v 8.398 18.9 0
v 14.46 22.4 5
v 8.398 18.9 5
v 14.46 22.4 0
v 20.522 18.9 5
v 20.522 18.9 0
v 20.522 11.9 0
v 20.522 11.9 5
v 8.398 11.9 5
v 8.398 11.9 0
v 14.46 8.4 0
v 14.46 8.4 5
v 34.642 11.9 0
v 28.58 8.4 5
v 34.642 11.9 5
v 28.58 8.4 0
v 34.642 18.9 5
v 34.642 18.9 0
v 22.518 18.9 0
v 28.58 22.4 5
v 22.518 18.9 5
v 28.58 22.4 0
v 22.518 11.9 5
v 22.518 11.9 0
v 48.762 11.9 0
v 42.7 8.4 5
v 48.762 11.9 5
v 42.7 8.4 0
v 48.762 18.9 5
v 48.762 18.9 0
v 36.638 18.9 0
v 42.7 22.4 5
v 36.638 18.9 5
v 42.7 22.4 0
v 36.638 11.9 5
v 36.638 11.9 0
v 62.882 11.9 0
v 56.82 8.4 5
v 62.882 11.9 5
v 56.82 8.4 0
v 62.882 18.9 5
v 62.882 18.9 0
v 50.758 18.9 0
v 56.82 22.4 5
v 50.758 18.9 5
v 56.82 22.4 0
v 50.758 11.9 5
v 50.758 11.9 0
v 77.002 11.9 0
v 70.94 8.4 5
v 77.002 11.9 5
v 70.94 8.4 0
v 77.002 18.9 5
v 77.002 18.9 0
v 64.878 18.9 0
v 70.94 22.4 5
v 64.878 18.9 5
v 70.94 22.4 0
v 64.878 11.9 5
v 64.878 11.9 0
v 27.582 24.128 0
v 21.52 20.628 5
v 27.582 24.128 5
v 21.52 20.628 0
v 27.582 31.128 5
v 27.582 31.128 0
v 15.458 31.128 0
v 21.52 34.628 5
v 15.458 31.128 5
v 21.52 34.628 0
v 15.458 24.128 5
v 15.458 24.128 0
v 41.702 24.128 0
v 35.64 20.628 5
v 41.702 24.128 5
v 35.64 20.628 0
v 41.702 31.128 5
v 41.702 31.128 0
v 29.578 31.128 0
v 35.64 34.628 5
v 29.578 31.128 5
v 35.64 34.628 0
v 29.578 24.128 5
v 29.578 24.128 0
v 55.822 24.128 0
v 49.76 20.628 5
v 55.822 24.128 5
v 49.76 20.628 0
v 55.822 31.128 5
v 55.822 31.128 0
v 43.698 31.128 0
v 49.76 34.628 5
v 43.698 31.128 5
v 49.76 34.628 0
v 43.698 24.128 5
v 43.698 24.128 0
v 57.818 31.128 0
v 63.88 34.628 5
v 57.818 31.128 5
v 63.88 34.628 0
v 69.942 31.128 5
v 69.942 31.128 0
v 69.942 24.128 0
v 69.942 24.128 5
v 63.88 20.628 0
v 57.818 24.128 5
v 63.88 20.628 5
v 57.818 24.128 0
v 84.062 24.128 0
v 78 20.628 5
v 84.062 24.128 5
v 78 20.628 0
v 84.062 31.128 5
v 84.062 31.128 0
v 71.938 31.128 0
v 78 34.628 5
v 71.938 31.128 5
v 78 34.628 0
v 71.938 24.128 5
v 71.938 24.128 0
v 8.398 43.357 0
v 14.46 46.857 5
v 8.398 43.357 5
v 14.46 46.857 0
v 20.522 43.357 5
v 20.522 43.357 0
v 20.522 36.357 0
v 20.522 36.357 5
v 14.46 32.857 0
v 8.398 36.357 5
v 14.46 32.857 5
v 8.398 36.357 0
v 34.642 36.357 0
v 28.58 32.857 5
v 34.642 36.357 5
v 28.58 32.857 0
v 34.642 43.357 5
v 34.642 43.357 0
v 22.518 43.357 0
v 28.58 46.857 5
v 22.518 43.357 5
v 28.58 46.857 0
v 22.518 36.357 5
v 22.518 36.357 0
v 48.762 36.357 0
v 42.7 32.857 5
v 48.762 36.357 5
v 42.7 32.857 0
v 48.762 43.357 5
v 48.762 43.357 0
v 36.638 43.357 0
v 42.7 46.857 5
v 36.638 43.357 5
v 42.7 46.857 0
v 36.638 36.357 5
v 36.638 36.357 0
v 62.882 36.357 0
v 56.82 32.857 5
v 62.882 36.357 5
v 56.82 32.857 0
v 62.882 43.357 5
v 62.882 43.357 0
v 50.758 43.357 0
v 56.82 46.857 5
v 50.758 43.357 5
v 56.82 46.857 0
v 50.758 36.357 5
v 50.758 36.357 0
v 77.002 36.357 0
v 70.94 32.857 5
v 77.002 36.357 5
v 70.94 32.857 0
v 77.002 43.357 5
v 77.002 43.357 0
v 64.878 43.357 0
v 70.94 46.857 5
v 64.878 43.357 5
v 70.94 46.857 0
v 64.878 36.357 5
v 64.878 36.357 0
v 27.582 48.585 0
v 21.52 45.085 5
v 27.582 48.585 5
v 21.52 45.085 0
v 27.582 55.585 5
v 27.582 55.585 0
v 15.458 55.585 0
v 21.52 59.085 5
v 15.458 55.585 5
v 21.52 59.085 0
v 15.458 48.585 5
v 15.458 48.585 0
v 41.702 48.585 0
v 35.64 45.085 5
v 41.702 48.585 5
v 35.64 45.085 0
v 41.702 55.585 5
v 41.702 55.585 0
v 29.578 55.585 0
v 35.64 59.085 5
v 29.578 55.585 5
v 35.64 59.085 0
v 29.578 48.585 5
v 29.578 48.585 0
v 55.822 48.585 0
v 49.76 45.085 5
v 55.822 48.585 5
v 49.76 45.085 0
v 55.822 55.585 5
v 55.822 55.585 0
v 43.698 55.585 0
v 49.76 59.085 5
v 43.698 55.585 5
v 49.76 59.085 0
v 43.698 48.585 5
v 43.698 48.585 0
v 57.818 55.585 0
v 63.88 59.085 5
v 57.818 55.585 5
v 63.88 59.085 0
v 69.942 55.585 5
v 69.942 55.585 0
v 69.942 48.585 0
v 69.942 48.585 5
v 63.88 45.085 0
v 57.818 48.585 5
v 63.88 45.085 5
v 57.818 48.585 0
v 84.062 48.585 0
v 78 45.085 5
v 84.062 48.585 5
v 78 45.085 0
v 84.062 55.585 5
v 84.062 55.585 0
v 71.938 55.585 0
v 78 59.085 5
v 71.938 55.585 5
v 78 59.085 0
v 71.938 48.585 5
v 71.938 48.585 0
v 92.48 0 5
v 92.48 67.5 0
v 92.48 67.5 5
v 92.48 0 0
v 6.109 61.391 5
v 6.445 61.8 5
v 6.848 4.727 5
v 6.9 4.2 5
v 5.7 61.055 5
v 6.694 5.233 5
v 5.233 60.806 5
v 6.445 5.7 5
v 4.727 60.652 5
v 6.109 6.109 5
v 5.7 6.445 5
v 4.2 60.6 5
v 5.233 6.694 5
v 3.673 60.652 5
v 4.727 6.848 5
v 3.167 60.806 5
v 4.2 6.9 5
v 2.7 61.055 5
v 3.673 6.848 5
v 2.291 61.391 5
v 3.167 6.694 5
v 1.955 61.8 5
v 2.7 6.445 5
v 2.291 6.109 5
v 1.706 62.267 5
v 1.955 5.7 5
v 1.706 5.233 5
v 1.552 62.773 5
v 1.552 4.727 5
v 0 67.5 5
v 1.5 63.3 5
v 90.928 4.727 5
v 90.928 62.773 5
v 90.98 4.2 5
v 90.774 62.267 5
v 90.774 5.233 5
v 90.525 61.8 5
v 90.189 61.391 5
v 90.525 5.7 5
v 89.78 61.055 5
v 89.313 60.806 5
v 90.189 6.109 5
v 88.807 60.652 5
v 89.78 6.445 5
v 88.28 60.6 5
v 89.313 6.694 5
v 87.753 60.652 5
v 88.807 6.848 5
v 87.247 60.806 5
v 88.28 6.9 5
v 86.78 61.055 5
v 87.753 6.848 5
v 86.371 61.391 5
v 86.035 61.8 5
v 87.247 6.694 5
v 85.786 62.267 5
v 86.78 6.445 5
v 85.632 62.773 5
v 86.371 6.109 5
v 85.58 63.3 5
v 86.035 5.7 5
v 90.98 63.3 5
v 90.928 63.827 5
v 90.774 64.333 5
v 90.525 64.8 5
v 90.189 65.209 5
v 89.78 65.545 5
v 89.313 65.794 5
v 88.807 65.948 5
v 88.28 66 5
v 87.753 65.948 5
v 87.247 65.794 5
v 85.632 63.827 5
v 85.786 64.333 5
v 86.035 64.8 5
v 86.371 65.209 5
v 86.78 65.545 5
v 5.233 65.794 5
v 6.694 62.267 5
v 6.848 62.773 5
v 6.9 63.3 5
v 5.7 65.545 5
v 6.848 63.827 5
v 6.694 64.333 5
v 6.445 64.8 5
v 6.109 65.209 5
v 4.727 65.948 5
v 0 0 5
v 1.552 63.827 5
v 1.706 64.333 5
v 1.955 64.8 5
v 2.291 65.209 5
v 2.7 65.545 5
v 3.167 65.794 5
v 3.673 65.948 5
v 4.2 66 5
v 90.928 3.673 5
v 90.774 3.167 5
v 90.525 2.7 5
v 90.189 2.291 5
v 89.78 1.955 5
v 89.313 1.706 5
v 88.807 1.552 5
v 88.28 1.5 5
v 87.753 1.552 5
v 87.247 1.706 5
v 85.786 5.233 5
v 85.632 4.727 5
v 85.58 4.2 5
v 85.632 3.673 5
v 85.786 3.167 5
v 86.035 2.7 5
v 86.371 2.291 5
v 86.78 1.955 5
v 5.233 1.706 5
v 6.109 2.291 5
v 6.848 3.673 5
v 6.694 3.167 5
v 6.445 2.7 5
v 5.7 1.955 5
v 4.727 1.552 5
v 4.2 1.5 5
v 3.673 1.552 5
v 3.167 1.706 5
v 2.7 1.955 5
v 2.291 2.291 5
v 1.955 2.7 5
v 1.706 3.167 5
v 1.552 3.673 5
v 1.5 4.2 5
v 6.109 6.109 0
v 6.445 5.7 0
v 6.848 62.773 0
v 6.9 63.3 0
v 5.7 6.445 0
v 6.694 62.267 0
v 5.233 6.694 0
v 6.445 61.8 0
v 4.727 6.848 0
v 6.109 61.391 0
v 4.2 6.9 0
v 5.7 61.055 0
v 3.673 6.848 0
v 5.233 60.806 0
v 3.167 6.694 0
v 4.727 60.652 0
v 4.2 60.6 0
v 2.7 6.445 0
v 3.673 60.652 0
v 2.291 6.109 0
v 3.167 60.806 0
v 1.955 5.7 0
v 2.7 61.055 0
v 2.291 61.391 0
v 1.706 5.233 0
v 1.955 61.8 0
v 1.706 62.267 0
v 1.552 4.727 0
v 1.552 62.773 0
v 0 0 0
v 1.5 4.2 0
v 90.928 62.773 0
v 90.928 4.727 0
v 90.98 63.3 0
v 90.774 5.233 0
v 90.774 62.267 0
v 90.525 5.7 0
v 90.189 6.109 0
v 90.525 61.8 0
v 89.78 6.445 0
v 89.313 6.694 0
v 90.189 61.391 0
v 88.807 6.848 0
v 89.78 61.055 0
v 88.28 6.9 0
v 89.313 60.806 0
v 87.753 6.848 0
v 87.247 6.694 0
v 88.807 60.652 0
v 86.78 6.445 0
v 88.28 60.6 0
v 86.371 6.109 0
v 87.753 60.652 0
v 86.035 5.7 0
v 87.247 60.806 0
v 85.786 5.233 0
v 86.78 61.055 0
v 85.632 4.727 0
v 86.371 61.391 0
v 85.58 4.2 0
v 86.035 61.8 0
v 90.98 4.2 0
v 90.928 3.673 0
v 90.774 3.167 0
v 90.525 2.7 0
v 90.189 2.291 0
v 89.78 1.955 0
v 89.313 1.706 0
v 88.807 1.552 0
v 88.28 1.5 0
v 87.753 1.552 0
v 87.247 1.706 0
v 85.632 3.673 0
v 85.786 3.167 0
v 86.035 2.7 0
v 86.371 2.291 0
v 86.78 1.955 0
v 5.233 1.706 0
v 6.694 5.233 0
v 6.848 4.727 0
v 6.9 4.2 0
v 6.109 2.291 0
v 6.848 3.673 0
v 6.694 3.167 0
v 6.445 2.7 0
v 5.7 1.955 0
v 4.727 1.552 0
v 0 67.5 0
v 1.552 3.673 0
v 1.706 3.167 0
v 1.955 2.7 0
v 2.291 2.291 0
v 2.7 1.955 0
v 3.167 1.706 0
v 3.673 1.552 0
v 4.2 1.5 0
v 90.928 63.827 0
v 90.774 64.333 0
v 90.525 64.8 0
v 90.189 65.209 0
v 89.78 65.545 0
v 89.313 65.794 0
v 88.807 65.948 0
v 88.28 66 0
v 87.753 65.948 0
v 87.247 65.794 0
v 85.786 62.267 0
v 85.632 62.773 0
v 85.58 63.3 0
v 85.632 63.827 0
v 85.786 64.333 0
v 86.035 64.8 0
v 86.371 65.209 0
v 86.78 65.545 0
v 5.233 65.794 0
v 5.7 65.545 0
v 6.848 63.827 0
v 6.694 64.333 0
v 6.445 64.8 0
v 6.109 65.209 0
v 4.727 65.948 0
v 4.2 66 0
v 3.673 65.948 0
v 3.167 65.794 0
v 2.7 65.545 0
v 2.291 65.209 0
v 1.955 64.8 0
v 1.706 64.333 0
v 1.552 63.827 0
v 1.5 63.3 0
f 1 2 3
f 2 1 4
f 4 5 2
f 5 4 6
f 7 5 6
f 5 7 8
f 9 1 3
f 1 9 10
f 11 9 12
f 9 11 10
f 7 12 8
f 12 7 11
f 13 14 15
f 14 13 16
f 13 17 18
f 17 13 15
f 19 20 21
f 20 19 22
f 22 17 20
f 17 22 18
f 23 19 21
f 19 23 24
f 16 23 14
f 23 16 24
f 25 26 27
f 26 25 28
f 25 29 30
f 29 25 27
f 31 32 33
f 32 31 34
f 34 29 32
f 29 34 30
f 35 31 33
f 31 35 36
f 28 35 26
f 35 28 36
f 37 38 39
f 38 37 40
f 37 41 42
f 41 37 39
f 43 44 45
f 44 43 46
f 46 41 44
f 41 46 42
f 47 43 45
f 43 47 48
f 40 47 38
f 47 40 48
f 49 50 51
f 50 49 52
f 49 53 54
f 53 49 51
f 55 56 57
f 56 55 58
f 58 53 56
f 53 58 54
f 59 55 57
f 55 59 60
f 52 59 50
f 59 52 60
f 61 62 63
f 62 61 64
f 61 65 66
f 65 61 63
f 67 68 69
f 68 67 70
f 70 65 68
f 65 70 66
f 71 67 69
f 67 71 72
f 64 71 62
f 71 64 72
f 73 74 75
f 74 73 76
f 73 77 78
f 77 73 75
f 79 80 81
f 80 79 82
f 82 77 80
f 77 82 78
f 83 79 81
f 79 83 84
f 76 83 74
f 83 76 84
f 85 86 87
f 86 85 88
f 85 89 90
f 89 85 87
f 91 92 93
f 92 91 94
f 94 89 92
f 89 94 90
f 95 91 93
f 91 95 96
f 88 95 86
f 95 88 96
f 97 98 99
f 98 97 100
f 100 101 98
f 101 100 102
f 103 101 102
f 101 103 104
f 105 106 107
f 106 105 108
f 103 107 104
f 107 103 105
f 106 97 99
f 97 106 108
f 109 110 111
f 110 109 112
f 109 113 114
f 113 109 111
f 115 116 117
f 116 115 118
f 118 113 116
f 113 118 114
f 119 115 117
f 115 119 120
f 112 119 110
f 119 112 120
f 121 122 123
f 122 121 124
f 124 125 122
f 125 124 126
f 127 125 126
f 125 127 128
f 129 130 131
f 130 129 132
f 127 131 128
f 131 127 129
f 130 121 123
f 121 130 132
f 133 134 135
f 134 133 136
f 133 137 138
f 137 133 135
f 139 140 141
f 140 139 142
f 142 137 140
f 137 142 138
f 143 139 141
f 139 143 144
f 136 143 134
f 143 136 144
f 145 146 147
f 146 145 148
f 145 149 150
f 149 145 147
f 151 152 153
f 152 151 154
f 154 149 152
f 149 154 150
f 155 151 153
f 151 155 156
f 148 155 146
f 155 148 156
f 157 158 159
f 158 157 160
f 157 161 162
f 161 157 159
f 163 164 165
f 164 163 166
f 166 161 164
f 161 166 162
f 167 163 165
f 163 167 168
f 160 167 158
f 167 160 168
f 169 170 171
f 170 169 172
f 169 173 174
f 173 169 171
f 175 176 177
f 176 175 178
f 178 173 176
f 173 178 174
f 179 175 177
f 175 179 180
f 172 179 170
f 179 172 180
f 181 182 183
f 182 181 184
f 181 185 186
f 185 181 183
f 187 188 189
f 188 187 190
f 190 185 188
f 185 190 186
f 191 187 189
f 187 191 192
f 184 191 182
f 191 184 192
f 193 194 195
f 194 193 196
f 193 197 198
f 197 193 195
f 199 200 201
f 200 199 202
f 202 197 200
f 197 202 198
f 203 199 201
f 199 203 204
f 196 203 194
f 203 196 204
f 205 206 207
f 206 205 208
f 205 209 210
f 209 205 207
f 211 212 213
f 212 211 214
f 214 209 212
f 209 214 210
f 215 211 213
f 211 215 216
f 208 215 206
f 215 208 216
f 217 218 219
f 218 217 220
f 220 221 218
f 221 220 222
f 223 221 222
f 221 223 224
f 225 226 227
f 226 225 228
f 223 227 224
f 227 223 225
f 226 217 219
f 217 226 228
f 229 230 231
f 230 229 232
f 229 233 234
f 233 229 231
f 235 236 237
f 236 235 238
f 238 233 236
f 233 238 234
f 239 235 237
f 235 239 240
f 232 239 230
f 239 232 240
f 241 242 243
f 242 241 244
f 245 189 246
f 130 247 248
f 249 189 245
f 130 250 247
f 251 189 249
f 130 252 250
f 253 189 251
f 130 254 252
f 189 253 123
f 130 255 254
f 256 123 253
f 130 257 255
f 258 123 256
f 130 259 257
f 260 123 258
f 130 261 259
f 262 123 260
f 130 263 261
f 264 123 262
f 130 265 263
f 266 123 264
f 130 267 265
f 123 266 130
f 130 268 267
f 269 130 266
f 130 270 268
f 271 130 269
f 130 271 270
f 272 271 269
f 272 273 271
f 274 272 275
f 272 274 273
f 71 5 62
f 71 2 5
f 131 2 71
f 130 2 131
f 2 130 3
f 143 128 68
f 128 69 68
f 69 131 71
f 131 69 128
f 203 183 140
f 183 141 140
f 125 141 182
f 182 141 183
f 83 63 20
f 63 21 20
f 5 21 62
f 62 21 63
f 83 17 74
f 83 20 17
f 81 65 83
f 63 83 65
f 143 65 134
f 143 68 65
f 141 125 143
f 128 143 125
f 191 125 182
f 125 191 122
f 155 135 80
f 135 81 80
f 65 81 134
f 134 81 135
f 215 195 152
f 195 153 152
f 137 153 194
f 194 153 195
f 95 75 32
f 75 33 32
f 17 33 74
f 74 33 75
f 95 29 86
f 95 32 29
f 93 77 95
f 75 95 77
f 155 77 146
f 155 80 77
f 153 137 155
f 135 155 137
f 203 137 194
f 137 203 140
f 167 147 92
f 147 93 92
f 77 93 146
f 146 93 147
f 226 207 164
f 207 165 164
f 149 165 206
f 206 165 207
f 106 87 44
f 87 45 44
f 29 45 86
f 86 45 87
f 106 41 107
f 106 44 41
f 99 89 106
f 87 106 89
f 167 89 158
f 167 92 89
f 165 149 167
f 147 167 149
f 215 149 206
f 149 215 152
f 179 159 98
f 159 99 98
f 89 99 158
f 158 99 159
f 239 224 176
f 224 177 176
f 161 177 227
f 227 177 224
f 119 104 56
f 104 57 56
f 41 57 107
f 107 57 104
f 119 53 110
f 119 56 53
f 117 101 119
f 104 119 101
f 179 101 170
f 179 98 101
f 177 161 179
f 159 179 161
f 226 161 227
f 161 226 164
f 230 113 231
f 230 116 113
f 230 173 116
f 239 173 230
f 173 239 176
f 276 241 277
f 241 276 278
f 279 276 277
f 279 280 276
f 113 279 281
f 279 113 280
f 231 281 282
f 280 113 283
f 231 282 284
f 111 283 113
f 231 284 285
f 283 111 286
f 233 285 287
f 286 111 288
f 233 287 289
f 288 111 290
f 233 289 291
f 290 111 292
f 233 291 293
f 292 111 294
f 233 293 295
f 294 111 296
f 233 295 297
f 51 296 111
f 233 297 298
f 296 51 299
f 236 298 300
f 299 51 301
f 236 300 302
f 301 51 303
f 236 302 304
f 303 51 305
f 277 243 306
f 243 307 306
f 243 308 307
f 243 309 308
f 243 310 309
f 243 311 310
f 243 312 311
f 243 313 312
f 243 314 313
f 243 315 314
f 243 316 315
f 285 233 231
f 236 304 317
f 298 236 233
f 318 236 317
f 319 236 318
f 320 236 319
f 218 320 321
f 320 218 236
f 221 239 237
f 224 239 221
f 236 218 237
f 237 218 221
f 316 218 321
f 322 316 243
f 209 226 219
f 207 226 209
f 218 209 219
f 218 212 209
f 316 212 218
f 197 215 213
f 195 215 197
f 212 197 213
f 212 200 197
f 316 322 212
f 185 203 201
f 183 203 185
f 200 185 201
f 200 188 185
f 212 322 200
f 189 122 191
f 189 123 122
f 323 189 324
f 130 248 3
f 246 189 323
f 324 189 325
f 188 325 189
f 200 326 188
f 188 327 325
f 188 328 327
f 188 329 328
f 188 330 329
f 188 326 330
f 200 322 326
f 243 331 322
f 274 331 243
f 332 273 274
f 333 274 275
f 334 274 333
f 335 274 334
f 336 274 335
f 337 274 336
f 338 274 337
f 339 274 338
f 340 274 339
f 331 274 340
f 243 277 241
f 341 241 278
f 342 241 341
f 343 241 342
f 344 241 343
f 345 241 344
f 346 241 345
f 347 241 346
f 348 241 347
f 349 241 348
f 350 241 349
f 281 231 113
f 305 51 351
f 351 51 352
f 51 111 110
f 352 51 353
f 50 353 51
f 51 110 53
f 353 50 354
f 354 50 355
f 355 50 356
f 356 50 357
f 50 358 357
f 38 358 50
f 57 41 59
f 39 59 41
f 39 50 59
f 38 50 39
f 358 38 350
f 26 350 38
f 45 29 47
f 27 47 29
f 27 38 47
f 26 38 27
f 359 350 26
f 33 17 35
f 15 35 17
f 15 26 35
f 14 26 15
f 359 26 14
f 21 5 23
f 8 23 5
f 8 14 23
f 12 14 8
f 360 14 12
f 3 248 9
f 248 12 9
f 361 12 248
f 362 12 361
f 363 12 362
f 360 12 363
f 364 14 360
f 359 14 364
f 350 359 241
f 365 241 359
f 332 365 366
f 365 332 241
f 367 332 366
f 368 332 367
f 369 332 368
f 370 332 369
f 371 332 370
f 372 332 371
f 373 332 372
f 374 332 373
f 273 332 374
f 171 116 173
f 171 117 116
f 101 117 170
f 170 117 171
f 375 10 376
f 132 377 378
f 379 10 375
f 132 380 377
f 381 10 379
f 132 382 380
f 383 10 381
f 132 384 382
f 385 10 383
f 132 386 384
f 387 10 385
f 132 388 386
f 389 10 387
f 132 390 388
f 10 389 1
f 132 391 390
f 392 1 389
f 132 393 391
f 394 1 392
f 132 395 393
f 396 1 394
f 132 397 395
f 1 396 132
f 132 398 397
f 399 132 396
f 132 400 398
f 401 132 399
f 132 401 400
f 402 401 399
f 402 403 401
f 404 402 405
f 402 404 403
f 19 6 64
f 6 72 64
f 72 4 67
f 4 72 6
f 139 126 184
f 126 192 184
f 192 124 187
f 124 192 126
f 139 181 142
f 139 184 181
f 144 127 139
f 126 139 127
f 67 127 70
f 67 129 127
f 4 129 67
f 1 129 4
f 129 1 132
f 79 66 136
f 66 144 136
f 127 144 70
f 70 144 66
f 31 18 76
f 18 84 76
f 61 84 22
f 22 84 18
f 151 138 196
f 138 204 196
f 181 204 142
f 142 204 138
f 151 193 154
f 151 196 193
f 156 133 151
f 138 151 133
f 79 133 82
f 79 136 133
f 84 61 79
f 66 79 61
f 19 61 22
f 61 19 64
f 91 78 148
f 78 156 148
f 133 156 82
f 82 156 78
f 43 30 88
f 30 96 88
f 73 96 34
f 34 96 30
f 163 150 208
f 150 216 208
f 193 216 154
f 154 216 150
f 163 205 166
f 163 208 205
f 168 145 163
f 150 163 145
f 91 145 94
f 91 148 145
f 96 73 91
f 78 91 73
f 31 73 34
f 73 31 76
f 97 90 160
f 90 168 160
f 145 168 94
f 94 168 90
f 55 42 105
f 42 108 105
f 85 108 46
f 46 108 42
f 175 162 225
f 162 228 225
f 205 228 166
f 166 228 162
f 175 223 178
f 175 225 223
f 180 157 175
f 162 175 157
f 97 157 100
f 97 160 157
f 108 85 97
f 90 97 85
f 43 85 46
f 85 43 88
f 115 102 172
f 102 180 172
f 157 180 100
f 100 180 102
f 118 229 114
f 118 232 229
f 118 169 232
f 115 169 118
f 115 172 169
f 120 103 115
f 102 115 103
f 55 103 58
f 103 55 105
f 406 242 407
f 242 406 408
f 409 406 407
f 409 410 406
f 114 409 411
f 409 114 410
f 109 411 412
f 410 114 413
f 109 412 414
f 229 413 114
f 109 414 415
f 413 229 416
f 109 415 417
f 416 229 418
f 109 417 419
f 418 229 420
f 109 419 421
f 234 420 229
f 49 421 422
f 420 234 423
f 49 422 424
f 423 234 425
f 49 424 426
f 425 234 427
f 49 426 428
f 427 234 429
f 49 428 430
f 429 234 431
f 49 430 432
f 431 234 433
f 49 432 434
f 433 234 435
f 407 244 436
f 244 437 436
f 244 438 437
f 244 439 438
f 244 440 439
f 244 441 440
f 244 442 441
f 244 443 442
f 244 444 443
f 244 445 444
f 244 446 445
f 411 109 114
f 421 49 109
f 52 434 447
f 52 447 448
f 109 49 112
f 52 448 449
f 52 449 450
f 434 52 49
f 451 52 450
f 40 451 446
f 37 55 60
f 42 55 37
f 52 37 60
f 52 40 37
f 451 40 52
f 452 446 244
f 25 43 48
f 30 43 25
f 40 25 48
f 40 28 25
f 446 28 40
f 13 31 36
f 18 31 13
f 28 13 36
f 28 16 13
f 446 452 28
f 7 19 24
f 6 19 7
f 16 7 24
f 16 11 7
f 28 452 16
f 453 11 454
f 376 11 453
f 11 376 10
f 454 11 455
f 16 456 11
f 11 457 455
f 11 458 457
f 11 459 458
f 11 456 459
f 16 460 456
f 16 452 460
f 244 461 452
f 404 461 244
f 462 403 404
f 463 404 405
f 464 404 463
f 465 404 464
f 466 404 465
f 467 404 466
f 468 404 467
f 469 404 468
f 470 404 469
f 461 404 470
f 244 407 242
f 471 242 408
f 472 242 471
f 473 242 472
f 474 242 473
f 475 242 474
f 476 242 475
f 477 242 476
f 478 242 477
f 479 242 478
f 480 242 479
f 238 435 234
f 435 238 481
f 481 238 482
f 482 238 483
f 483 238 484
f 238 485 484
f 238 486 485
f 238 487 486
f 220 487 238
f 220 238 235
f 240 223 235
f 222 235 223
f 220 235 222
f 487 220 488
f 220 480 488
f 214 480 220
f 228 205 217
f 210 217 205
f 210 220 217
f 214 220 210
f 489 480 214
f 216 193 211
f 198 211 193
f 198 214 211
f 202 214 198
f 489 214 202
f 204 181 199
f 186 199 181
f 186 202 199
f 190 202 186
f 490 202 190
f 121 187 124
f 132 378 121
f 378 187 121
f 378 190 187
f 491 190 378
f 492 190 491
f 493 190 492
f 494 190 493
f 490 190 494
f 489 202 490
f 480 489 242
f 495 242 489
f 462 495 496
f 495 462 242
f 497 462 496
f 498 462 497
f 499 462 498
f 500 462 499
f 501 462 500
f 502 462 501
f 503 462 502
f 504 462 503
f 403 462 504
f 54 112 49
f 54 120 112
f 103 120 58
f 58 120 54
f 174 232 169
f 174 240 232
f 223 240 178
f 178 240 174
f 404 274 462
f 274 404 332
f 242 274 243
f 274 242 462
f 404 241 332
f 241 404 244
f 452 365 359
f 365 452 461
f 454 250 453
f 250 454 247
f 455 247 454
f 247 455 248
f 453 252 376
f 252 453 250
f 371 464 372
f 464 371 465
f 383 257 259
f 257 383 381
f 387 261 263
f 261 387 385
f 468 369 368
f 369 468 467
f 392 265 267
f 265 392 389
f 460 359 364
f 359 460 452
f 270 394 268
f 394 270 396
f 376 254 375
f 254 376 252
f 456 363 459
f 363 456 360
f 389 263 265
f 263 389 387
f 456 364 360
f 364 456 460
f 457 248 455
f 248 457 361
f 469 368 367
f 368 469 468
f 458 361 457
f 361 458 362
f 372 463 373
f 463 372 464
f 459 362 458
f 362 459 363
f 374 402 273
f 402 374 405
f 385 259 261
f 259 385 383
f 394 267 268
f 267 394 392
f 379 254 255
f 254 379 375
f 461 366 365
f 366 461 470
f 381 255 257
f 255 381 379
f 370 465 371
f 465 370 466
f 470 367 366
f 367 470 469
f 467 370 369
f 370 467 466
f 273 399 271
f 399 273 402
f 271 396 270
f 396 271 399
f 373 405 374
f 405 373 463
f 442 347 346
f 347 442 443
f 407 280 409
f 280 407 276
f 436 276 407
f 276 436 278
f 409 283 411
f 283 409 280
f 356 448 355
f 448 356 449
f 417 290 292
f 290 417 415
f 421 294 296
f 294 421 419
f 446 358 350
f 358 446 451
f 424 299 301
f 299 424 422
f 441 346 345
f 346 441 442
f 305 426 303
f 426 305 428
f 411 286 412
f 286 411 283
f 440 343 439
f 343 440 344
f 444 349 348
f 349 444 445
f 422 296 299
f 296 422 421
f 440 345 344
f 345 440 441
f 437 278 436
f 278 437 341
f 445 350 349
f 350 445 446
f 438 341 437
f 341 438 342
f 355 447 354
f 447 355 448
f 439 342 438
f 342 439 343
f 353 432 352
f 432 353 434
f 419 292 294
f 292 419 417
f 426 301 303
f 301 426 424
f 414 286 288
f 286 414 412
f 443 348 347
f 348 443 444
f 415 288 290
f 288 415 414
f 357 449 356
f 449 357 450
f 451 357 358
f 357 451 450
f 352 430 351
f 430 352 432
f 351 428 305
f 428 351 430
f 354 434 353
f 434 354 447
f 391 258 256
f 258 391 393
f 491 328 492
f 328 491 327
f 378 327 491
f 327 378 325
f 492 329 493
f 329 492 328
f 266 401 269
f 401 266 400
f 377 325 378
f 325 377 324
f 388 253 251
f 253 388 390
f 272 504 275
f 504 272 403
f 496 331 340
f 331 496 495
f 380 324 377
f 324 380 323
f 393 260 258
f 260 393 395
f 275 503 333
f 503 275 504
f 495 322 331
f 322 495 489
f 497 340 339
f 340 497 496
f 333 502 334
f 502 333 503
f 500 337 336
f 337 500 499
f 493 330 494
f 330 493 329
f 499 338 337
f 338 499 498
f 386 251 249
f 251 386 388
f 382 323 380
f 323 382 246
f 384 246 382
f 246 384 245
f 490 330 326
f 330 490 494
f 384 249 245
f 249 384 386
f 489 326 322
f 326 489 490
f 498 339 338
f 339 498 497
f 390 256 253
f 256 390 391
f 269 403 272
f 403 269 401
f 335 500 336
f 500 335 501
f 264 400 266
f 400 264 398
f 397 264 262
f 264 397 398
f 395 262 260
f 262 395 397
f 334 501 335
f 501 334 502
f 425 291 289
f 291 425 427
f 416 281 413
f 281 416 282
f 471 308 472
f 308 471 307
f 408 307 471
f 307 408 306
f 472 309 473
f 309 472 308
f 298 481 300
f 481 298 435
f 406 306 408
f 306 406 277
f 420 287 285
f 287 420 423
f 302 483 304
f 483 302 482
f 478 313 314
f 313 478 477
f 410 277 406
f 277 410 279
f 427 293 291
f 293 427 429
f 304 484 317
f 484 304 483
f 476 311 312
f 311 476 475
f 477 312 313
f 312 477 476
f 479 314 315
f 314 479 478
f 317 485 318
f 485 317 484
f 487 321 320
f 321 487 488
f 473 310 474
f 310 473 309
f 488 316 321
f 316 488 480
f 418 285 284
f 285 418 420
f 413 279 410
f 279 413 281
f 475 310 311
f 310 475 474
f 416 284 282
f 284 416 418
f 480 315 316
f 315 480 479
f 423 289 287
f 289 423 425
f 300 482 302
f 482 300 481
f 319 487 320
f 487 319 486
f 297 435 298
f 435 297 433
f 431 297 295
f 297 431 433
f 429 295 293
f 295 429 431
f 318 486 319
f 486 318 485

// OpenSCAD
$fn = 32;

// ----------------------------------------------------------------------
// Honeycomb panel: 92.48 x 67.5 mm, 20 cells of 14 mm
// ----------------------------------------------------------------------

// --- parameters (mm) ---
panel_w = 92.48;          // panel width
panel_d = 67.5;           // panel depth
thick = 5;                // panel thickness
cell_r = 7;               // hex cell circumradius
pitch = 14.12;            // hex cell pitch (centre to centre)
web = 2;                  // web between the cells
columns = 5;              // columns of cells
rows = 4;                 // rows of cells
cell_count = 20;          // total cells
shift_x = 14.46;          // first cell offset in x
shift_y = 15.4;           // first cell offset in y
mount_d = 5.4;            // corner mounting holes
hole_off = 4.2;           // mounting hole offset from the corners

difference() {
  union() {
    cube([panel_w, panel_d, thick]);
  }
  /* hexagonal cells, point-up, cut right through the plate */
  for (row = [0 : rows - 1]) {
    for (col = [0 : columns - 1]) {
      translate([shift_x + col * pitch + (row % 2) * pitch / 2, shift_y + row * pitch * 0.866025, -2.5]) rotate([0, 0, 30]) cylinder(h = thick + 5, d = 2 * cell_r, $fn = 6);
    }
  }
  /* corner mounting holes, clear of the outer cell web */
  translate([4.2, 4.2, -2.5]) cylinder(h = thick + 5, d = mount_d);
  translate([88.28, 4.2, -2.5]) cylinder(h = thick + 5, d = mount_d);
  translate([4.2, 63.3, -2.5]) cylinder(h = thick + 5, d = mount_d);
  translate([88.28, 63.3, -2.5]) cylinder(h = thick + 5, d = mount_d);
}
